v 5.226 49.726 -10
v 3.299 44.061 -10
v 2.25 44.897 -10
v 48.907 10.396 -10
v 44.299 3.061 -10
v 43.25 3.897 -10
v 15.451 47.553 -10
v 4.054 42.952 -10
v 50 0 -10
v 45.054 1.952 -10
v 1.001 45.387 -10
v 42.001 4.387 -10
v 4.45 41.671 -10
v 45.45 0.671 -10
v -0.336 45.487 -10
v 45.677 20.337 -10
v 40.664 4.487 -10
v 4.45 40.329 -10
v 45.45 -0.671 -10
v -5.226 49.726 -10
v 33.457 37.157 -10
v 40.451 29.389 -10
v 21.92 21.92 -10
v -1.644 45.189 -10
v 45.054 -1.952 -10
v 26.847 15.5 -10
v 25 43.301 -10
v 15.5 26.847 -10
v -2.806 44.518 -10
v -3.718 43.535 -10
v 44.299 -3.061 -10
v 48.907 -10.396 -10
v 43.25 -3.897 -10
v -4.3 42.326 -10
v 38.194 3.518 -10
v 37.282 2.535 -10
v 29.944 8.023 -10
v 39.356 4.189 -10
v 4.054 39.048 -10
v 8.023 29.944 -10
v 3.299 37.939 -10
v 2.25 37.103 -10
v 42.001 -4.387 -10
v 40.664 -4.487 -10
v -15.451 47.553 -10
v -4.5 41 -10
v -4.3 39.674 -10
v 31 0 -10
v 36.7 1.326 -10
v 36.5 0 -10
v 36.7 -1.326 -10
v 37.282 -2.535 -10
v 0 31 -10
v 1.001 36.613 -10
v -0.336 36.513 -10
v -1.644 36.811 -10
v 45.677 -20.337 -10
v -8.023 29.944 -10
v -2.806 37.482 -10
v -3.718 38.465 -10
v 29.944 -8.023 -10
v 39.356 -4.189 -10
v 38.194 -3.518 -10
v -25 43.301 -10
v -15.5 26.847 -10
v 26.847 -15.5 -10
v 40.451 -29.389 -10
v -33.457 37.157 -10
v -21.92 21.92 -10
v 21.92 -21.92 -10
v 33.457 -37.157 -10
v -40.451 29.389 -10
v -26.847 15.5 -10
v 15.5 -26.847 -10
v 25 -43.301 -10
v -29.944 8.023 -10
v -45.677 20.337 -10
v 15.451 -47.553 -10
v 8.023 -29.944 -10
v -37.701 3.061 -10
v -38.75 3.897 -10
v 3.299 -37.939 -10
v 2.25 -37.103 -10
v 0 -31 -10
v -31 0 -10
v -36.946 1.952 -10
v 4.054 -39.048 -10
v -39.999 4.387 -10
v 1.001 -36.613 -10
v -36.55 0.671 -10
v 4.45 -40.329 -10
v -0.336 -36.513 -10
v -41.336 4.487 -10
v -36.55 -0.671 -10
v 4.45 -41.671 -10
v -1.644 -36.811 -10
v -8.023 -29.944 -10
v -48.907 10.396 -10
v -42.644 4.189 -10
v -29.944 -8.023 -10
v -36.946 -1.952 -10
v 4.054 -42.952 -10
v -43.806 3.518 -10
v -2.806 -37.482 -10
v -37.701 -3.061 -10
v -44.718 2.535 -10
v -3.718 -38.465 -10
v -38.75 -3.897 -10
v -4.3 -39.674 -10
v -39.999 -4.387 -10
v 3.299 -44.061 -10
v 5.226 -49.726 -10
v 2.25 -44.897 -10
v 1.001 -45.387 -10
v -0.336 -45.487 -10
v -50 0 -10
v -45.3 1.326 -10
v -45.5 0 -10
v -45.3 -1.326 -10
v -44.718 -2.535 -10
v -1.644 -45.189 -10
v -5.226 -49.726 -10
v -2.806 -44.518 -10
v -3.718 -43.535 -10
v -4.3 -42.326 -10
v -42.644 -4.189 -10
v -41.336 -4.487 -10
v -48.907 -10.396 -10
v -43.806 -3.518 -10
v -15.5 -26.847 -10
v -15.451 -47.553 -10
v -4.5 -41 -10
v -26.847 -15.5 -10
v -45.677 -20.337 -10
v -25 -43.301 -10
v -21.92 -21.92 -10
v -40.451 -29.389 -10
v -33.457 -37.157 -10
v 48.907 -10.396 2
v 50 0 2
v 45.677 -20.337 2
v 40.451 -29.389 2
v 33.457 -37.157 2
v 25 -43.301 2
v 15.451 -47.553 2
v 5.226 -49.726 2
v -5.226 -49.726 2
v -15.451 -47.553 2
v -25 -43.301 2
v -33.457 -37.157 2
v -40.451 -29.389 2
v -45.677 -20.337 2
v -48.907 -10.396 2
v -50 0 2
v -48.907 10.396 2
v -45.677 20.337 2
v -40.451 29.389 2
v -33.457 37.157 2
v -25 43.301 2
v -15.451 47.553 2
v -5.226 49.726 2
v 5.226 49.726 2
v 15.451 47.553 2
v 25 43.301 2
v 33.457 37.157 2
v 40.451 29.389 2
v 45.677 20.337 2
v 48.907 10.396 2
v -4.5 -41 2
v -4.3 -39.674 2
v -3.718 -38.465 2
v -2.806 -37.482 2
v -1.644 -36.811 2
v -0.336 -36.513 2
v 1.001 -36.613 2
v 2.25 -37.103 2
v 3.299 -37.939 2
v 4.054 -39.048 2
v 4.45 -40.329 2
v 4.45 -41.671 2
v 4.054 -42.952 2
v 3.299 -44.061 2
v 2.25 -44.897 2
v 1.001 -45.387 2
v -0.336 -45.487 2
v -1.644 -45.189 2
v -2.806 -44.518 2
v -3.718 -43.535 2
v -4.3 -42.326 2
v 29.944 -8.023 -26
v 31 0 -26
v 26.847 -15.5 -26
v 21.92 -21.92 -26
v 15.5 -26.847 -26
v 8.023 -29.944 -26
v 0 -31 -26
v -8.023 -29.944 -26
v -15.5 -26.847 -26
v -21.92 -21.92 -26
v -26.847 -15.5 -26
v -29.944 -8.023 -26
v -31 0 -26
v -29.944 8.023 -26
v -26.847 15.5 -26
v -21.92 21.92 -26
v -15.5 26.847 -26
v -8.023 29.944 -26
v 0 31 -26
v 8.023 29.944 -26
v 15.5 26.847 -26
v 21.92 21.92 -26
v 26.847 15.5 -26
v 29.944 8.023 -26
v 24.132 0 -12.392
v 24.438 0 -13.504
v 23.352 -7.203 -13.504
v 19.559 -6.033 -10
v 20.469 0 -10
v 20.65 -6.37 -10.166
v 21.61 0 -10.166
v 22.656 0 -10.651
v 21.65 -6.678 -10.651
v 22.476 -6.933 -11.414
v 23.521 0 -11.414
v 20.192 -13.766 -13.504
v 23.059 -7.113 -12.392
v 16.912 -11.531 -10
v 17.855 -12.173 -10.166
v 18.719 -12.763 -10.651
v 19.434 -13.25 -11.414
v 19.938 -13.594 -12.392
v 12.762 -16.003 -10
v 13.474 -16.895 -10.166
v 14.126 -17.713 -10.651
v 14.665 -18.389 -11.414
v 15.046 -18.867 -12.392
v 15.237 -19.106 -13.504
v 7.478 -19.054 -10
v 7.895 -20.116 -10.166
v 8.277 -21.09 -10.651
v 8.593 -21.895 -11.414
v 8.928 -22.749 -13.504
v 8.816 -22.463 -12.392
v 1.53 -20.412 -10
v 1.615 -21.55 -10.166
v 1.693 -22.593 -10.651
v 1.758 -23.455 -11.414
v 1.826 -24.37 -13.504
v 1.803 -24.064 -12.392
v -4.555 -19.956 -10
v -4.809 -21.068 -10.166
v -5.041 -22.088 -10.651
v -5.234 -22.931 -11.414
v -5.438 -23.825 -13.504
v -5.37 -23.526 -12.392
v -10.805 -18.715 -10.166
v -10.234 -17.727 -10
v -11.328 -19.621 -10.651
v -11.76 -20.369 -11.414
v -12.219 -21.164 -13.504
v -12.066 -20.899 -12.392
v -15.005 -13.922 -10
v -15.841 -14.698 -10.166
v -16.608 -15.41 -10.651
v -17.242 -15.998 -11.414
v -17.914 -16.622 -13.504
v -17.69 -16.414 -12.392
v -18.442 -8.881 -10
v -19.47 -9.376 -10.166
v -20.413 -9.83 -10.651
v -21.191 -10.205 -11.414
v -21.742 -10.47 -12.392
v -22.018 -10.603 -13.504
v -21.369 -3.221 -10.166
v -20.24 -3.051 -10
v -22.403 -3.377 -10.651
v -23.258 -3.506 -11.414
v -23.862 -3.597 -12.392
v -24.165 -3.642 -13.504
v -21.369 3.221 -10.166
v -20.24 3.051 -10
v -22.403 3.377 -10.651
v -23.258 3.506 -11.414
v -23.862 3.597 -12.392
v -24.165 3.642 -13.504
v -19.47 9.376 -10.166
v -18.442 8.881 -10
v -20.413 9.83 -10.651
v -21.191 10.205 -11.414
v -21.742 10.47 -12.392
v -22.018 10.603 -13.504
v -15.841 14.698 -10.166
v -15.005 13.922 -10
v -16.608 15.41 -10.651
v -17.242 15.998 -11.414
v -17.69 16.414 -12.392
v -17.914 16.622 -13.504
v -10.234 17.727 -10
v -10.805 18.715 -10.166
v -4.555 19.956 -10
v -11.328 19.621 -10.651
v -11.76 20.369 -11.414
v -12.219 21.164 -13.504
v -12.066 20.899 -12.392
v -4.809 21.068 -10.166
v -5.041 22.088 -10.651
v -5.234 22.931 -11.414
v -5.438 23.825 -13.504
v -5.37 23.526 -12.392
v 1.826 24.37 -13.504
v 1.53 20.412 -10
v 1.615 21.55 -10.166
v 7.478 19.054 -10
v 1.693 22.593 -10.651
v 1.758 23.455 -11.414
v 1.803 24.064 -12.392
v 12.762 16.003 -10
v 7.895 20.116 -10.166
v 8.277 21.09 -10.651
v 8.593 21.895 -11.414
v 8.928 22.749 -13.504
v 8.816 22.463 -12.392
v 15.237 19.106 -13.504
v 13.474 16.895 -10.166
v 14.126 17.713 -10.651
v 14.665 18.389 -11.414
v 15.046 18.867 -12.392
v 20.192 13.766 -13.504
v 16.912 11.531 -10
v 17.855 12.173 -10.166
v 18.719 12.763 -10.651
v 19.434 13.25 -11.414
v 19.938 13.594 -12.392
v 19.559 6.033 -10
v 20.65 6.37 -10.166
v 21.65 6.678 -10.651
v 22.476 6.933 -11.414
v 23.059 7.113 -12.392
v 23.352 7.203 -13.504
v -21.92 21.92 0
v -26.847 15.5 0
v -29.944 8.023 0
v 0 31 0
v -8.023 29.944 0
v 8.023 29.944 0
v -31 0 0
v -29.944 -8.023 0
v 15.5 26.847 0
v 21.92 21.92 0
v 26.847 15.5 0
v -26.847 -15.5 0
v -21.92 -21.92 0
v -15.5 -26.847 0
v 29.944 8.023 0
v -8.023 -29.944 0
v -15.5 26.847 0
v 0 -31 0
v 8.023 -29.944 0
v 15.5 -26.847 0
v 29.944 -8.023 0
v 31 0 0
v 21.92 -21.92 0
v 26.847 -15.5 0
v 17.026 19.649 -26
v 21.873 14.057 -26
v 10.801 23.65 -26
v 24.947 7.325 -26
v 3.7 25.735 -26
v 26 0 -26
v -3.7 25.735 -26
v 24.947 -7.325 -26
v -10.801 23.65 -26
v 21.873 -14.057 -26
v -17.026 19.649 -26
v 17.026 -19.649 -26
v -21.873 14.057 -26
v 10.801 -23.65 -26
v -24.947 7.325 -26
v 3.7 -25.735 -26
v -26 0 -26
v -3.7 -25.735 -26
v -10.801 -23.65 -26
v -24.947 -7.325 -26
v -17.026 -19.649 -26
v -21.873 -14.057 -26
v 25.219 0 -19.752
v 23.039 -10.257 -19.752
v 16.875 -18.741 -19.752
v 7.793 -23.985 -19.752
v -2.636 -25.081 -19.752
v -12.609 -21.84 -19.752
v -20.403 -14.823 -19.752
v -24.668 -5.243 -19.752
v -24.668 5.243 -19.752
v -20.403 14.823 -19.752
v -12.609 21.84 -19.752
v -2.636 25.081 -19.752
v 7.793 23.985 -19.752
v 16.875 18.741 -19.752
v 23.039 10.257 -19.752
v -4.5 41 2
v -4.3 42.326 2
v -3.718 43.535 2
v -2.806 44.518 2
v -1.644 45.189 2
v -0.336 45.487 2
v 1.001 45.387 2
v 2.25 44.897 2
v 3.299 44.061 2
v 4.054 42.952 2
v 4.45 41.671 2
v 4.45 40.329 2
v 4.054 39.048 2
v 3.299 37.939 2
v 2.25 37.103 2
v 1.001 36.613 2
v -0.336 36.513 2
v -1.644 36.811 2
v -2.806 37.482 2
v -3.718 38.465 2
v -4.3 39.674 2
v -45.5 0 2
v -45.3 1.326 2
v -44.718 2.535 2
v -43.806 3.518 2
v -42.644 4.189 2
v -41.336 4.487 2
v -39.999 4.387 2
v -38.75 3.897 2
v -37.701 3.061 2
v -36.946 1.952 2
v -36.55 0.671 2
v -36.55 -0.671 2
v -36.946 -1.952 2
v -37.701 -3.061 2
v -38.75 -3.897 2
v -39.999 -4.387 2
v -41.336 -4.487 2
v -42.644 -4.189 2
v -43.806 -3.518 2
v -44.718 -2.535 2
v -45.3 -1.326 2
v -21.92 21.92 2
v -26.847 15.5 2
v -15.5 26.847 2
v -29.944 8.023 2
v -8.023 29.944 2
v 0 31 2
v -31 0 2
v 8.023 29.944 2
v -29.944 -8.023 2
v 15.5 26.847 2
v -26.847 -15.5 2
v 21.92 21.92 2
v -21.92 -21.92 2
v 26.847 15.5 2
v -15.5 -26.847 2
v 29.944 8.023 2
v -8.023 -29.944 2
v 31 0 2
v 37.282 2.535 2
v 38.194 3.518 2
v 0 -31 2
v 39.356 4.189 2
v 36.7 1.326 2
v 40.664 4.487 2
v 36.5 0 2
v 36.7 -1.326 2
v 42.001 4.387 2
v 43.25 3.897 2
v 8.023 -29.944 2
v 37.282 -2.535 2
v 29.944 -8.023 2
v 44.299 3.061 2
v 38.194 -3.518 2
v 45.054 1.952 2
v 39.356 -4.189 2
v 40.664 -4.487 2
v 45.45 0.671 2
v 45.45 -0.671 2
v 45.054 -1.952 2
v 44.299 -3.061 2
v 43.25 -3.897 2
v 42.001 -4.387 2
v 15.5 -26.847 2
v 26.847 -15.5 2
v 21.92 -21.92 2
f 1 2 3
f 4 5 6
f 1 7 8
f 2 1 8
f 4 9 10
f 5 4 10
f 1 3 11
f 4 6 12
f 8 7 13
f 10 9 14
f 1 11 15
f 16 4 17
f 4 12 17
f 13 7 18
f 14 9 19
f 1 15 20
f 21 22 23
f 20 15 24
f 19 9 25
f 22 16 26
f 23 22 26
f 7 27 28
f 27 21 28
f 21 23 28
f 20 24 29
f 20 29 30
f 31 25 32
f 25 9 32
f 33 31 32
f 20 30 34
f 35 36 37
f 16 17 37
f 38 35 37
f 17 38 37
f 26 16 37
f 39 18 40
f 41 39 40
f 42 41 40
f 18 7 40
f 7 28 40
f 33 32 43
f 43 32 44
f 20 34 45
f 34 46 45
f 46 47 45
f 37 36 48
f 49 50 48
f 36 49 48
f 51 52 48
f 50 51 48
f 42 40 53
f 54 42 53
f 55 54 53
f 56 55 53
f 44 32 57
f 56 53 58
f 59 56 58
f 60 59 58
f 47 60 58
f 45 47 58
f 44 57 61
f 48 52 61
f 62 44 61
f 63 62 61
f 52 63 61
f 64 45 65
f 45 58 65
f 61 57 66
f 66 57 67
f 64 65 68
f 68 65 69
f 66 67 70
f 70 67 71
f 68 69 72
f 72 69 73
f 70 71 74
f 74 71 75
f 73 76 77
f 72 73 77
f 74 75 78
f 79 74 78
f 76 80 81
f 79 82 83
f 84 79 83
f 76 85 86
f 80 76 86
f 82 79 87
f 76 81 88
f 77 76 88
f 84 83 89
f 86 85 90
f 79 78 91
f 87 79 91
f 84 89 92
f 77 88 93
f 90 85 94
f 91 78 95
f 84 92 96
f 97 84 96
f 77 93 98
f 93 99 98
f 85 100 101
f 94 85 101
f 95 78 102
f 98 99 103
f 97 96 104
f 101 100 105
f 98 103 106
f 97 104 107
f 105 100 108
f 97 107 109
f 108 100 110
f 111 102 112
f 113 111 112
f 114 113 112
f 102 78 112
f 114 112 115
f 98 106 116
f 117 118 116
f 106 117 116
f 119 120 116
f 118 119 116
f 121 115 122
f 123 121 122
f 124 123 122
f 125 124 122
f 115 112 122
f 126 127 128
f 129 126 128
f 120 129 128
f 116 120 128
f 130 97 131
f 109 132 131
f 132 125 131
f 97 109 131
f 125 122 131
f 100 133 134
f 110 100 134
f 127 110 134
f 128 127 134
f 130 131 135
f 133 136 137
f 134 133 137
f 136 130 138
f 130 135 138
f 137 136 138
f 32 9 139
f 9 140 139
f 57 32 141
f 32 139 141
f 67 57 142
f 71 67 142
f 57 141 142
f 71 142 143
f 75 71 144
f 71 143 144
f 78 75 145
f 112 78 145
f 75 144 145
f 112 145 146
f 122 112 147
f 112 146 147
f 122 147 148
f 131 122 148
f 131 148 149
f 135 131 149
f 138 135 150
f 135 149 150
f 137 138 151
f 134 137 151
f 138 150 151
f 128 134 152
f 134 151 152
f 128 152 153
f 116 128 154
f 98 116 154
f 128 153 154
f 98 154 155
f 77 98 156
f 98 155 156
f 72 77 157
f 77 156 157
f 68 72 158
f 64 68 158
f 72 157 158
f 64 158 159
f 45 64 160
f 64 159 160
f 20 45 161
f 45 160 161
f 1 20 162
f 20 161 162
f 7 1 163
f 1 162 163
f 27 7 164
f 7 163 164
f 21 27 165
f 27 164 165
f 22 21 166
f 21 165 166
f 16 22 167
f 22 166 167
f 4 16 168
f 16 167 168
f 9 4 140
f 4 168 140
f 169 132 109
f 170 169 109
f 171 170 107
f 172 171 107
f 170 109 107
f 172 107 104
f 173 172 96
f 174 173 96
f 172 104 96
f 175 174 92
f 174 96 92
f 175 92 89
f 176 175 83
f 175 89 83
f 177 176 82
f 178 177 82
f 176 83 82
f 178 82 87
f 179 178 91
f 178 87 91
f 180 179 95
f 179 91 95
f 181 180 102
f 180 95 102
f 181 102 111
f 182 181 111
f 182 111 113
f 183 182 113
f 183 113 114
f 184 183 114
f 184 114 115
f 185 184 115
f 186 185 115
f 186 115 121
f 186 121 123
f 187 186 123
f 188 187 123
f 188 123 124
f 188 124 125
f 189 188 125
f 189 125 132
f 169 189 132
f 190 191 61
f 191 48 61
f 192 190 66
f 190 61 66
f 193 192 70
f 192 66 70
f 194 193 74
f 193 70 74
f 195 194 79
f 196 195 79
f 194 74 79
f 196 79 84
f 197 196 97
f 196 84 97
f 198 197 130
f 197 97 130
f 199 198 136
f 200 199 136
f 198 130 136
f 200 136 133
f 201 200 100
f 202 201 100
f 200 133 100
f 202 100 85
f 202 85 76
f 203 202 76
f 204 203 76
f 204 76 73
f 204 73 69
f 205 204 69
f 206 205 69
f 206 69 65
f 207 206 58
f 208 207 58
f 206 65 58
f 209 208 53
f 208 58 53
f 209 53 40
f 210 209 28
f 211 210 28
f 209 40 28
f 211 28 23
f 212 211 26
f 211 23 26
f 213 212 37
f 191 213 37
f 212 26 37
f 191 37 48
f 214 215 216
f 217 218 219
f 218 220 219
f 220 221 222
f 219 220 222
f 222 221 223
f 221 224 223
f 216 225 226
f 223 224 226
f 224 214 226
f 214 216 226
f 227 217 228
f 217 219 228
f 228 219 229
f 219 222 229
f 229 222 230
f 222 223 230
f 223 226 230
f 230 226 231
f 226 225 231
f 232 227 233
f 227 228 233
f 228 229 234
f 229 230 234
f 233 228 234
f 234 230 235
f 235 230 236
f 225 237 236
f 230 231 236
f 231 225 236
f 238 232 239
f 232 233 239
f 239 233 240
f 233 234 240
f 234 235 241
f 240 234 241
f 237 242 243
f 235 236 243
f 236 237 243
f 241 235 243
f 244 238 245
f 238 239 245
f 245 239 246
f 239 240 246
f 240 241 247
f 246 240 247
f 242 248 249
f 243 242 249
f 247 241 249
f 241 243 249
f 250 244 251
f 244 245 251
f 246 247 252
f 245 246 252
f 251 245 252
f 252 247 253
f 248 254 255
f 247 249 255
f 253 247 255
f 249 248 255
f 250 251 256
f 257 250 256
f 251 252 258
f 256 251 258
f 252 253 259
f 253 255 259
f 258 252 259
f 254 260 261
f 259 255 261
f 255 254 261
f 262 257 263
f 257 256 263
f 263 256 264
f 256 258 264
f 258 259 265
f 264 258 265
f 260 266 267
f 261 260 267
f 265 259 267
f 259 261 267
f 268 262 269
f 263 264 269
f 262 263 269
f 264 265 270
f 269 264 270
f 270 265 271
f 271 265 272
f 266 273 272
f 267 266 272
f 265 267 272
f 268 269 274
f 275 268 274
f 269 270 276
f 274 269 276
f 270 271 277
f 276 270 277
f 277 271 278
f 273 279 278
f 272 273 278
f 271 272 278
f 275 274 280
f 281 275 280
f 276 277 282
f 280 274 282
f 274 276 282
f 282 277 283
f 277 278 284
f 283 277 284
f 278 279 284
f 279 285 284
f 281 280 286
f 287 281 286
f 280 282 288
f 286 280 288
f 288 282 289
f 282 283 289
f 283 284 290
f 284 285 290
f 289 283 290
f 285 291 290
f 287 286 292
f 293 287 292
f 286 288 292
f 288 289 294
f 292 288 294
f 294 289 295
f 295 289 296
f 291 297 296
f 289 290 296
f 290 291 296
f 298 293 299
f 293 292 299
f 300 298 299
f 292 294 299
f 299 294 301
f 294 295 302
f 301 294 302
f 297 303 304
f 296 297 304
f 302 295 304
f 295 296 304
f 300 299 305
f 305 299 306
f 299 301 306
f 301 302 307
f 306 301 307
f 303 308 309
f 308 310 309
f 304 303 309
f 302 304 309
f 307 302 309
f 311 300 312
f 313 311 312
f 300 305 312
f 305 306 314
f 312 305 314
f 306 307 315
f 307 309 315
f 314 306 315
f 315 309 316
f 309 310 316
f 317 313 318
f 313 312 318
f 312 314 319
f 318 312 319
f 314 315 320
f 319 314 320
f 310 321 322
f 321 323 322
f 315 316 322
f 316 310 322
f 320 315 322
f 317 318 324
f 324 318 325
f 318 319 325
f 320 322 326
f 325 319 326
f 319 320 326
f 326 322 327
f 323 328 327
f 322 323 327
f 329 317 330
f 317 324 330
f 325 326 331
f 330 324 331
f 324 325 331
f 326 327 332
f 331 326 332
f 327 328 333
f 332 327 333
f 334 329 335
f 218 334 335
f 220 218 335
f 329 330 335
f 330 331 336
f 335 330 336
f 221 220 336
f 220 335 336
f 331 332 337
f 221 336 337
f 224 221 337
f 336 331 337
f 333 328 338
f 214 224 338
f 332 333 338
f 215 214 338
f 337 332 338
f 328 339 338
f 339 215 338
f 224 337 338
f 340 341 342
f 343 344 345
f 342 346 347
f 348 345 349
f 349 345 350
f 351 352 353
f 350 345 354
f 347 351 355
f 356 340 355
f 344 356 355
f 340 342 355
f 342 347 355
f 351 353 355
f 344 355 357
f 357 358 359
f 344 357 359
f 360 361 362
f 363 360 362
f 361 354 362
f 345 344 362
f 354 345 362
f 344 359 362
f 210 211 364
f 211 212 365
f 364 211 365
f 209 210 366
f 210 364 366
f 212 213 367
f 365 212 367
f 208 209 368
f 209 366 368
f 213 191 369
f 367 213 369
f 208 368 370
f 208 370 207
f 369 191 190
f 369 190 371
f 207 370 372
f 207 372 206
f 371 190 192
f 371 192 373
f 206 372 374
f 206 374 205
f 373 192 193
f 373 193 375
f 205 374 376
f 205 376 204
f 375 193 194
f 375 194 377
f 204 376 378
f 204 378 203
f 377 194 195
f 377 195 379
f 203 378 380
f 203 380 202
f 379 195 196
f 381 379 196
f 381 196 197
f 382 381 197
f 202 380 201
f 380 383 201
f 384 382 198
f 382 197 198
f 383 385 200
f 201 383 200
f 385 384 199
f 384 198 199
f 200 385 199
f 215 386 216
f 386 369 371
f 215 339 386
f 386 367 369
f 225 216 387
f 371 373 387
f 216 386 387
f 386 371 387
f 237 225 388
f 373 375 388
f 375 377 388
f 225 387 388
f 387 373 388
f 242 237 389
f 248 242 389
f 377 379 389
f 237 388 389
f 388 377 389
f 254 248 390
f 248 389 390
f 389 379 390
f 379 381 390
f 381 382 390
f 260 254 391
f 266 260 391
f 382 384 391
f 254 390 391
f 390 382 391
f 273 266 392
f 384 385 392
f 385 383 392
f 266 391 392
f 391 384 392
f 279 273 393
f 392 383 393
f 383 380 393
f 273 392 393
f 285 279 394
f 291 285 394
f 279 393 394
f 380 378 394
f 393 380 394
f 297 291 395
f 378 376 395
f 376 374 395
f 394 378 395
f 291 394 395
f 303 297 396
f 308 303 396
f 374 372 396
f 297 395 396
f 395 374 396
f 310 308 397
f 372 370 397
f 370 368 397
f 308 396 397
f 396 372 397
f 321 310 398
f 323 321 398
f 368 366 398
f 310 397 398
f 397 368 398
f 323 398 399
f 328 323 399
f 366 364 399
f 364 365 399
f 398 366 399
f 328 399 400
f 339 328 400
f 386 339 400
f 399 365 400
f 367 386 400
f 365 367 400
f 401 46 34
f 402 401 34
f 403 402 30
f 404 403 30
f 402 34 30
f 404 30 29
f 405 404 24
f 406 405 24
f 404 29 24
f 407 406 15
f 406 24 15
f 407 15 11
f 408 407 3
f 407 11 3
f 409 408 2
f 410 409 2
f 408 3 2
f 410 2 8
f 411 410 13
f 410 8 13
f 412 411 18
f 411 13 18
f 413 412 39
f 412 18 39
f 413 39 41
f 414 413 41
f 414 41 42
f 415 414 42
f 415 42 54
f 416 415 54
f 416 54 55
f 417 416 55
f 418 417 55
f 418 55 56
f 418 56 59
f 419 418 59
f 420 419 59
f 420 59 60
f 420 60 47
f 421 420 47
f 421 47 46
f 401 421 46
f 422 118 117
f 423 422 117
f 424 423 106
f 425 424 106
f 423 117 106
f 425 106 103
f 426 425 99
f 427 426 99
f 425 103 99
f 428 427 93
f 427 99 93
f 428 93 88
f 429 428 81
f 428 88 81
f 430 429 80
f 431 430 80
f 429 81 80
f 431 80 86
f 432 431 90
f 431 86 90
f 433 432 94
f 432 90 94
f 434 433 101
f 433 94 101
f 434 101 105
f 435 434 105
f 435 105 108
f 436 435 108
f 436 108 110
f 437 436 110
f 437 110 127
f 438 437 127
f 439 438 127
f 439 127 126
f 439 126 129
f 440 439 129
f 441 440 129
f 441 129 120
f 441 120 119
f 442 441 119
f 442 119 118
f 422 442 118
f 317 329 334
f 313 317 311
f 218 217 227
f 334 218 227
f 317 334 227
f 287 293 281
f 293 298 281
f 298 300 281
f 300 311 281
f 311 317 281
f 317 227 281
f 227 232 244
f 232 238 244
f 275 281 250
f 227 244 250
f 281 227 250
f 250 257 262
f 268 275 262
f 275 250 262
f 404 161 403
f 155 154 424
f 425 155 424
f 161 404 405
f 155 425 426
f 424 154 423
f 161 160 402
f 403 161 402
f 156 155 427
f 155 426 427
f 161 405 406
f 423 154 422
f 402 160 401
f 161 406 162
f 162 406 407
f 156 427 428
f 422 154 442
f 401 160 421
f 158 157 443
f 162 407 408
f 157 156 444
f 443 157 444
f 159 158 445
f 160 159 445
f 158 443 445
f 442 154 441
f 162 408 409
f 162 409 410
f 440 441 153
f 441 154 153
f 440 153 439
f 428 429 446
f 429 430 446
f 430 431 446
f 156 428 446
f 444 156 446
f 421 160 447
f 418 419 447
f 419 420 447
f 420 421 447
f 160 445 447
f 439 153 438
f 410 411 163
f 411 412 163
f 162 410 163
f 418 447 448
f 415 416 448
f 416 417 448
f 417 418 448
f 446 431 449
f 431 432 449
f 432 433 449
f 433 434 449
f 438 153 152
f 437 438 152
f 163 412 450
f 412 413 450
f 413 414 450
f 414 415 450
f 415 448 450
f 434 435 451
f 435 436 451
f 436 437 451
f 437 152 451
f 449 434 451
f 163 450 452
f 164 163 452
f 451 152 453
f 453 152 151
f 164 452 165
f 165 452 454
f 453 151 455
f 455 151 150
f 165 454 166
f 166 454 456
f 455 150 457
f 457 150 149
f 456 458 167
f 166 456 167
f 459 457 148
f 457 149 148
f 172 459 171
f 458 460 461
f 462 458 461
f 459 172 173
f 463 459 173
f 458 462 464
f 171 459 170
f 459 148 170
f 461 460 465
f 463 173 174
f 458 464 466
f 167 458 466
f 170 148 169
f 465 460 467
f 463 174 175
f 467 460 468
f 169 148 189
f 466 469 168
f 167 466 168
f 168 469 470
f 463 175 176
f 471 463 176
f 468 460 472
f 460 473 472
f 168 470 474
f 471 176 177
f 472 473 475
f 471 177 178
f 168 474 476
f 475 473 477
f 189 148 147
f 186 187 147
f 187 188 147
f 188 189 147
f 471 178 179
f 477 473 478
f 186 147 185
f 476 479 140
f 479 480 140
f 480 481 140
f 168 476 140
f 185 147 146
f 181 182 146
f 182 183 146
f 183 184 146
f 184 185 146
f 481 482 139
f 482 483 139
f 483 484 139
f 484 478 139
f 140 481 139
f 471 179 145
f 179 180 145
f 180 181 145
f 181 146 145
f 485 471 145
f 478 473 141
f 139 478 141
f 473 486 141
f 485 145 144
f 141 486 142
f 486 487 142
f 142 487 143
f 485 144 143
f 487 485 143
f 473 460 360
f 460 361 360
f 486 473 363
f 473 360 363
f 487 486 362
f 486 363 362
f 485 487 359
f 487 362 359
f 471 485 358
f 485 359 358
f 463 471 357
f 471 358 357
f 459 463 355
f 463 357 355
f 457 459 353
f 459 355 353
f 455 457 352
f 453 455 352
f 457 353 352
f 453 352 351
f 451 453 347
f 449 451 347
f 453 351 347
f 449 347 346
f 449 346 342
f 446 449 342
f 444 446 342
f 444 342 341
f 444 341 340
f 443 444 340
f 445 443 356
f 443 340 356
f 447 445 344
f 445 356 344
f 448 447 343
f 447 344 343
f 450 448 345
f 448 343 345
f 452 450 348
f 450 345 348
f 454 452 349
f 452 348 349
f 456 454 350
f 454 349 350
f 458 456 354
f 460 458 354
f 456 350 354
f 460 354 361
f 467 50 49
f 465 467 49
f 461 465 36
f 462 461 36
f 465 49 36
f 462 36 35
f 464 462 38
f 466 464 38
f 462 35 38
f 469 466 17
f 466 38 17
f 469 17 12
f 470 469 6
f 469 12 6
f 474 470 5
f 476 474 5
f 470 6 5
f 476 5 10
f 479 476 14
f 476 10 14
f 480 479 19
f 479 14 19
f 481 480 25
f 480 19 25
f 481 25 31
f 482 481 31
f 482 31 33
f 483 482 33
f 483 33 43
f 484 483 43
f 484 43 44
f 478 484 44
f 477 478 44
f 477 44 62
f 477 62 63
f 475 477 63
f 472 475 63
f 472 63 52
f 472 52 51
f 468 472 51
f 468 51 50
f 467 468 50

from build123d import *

# Parameters (mm, degrees)
SKETCH_2_R          = 4.5
CUT_EXTRUDE_1_DEPTH = 73.498275842


with BuildPart() as part:
    # 草图1 one side → 旋转4 (revolve)
    with BuildSketch(Plane(origin=(0, 0, 0), x_dir=(1, 0, 0), z_dir=(0, 1, 0)), mode=Mode.PRIVATE) as revolve_4_sk:
        with BuildLine():
            Line((0, 10), (-20.468871126, 10))
            ThreePointArc((-20.468871126, 10), (-23.116081379, 11.001287297), (-24.437982633, 13.503861062))
            Line((-24.437982633, 13.503861062), (-26, 26))
            Line((-26, 26), (-31, 26))
            Line((-31, 26), (-31, 10))
            Line((-31, 10), (-50, 10))
            Line((-50, 10), (-50, -2))
            Line((-50, -2), (-31, -2))
            Line((-31, -2), (-31, 0))
            Line((-31, 0), (0, 0))
            Line((0, 0), (0, 10))
        make_face()
    revolve(revolve_4_sk.sketch.rotate(Axis((0, 0, 0), (0, 0, -1)), 180), axis=Axis((0, 0, 0), (0, 0, -1)))

    # 草图2 → 切除-拉伸1 (cut, through all)
    with BuildSketch(Plane(origin=(0, 0, -10), x_dir=(-1, 0, 0), z_dir=(0, 0, -1))):
        with Locations((41, 0)):
            Circle(SKETCH_2_R)
        with Locations((0, -41)):
            Circle(SKETCH_2_R)
        with Locations((-41, 0)):
            Circle(SKETCH_2_R)
        with Locations((0, 41)):
            Circle(SKETCH_2_R)
    extrude(amount=-CUT_EXTRUDE_1_DEPTH, mode=Mode.SUBTRACT)


solid = part.part
